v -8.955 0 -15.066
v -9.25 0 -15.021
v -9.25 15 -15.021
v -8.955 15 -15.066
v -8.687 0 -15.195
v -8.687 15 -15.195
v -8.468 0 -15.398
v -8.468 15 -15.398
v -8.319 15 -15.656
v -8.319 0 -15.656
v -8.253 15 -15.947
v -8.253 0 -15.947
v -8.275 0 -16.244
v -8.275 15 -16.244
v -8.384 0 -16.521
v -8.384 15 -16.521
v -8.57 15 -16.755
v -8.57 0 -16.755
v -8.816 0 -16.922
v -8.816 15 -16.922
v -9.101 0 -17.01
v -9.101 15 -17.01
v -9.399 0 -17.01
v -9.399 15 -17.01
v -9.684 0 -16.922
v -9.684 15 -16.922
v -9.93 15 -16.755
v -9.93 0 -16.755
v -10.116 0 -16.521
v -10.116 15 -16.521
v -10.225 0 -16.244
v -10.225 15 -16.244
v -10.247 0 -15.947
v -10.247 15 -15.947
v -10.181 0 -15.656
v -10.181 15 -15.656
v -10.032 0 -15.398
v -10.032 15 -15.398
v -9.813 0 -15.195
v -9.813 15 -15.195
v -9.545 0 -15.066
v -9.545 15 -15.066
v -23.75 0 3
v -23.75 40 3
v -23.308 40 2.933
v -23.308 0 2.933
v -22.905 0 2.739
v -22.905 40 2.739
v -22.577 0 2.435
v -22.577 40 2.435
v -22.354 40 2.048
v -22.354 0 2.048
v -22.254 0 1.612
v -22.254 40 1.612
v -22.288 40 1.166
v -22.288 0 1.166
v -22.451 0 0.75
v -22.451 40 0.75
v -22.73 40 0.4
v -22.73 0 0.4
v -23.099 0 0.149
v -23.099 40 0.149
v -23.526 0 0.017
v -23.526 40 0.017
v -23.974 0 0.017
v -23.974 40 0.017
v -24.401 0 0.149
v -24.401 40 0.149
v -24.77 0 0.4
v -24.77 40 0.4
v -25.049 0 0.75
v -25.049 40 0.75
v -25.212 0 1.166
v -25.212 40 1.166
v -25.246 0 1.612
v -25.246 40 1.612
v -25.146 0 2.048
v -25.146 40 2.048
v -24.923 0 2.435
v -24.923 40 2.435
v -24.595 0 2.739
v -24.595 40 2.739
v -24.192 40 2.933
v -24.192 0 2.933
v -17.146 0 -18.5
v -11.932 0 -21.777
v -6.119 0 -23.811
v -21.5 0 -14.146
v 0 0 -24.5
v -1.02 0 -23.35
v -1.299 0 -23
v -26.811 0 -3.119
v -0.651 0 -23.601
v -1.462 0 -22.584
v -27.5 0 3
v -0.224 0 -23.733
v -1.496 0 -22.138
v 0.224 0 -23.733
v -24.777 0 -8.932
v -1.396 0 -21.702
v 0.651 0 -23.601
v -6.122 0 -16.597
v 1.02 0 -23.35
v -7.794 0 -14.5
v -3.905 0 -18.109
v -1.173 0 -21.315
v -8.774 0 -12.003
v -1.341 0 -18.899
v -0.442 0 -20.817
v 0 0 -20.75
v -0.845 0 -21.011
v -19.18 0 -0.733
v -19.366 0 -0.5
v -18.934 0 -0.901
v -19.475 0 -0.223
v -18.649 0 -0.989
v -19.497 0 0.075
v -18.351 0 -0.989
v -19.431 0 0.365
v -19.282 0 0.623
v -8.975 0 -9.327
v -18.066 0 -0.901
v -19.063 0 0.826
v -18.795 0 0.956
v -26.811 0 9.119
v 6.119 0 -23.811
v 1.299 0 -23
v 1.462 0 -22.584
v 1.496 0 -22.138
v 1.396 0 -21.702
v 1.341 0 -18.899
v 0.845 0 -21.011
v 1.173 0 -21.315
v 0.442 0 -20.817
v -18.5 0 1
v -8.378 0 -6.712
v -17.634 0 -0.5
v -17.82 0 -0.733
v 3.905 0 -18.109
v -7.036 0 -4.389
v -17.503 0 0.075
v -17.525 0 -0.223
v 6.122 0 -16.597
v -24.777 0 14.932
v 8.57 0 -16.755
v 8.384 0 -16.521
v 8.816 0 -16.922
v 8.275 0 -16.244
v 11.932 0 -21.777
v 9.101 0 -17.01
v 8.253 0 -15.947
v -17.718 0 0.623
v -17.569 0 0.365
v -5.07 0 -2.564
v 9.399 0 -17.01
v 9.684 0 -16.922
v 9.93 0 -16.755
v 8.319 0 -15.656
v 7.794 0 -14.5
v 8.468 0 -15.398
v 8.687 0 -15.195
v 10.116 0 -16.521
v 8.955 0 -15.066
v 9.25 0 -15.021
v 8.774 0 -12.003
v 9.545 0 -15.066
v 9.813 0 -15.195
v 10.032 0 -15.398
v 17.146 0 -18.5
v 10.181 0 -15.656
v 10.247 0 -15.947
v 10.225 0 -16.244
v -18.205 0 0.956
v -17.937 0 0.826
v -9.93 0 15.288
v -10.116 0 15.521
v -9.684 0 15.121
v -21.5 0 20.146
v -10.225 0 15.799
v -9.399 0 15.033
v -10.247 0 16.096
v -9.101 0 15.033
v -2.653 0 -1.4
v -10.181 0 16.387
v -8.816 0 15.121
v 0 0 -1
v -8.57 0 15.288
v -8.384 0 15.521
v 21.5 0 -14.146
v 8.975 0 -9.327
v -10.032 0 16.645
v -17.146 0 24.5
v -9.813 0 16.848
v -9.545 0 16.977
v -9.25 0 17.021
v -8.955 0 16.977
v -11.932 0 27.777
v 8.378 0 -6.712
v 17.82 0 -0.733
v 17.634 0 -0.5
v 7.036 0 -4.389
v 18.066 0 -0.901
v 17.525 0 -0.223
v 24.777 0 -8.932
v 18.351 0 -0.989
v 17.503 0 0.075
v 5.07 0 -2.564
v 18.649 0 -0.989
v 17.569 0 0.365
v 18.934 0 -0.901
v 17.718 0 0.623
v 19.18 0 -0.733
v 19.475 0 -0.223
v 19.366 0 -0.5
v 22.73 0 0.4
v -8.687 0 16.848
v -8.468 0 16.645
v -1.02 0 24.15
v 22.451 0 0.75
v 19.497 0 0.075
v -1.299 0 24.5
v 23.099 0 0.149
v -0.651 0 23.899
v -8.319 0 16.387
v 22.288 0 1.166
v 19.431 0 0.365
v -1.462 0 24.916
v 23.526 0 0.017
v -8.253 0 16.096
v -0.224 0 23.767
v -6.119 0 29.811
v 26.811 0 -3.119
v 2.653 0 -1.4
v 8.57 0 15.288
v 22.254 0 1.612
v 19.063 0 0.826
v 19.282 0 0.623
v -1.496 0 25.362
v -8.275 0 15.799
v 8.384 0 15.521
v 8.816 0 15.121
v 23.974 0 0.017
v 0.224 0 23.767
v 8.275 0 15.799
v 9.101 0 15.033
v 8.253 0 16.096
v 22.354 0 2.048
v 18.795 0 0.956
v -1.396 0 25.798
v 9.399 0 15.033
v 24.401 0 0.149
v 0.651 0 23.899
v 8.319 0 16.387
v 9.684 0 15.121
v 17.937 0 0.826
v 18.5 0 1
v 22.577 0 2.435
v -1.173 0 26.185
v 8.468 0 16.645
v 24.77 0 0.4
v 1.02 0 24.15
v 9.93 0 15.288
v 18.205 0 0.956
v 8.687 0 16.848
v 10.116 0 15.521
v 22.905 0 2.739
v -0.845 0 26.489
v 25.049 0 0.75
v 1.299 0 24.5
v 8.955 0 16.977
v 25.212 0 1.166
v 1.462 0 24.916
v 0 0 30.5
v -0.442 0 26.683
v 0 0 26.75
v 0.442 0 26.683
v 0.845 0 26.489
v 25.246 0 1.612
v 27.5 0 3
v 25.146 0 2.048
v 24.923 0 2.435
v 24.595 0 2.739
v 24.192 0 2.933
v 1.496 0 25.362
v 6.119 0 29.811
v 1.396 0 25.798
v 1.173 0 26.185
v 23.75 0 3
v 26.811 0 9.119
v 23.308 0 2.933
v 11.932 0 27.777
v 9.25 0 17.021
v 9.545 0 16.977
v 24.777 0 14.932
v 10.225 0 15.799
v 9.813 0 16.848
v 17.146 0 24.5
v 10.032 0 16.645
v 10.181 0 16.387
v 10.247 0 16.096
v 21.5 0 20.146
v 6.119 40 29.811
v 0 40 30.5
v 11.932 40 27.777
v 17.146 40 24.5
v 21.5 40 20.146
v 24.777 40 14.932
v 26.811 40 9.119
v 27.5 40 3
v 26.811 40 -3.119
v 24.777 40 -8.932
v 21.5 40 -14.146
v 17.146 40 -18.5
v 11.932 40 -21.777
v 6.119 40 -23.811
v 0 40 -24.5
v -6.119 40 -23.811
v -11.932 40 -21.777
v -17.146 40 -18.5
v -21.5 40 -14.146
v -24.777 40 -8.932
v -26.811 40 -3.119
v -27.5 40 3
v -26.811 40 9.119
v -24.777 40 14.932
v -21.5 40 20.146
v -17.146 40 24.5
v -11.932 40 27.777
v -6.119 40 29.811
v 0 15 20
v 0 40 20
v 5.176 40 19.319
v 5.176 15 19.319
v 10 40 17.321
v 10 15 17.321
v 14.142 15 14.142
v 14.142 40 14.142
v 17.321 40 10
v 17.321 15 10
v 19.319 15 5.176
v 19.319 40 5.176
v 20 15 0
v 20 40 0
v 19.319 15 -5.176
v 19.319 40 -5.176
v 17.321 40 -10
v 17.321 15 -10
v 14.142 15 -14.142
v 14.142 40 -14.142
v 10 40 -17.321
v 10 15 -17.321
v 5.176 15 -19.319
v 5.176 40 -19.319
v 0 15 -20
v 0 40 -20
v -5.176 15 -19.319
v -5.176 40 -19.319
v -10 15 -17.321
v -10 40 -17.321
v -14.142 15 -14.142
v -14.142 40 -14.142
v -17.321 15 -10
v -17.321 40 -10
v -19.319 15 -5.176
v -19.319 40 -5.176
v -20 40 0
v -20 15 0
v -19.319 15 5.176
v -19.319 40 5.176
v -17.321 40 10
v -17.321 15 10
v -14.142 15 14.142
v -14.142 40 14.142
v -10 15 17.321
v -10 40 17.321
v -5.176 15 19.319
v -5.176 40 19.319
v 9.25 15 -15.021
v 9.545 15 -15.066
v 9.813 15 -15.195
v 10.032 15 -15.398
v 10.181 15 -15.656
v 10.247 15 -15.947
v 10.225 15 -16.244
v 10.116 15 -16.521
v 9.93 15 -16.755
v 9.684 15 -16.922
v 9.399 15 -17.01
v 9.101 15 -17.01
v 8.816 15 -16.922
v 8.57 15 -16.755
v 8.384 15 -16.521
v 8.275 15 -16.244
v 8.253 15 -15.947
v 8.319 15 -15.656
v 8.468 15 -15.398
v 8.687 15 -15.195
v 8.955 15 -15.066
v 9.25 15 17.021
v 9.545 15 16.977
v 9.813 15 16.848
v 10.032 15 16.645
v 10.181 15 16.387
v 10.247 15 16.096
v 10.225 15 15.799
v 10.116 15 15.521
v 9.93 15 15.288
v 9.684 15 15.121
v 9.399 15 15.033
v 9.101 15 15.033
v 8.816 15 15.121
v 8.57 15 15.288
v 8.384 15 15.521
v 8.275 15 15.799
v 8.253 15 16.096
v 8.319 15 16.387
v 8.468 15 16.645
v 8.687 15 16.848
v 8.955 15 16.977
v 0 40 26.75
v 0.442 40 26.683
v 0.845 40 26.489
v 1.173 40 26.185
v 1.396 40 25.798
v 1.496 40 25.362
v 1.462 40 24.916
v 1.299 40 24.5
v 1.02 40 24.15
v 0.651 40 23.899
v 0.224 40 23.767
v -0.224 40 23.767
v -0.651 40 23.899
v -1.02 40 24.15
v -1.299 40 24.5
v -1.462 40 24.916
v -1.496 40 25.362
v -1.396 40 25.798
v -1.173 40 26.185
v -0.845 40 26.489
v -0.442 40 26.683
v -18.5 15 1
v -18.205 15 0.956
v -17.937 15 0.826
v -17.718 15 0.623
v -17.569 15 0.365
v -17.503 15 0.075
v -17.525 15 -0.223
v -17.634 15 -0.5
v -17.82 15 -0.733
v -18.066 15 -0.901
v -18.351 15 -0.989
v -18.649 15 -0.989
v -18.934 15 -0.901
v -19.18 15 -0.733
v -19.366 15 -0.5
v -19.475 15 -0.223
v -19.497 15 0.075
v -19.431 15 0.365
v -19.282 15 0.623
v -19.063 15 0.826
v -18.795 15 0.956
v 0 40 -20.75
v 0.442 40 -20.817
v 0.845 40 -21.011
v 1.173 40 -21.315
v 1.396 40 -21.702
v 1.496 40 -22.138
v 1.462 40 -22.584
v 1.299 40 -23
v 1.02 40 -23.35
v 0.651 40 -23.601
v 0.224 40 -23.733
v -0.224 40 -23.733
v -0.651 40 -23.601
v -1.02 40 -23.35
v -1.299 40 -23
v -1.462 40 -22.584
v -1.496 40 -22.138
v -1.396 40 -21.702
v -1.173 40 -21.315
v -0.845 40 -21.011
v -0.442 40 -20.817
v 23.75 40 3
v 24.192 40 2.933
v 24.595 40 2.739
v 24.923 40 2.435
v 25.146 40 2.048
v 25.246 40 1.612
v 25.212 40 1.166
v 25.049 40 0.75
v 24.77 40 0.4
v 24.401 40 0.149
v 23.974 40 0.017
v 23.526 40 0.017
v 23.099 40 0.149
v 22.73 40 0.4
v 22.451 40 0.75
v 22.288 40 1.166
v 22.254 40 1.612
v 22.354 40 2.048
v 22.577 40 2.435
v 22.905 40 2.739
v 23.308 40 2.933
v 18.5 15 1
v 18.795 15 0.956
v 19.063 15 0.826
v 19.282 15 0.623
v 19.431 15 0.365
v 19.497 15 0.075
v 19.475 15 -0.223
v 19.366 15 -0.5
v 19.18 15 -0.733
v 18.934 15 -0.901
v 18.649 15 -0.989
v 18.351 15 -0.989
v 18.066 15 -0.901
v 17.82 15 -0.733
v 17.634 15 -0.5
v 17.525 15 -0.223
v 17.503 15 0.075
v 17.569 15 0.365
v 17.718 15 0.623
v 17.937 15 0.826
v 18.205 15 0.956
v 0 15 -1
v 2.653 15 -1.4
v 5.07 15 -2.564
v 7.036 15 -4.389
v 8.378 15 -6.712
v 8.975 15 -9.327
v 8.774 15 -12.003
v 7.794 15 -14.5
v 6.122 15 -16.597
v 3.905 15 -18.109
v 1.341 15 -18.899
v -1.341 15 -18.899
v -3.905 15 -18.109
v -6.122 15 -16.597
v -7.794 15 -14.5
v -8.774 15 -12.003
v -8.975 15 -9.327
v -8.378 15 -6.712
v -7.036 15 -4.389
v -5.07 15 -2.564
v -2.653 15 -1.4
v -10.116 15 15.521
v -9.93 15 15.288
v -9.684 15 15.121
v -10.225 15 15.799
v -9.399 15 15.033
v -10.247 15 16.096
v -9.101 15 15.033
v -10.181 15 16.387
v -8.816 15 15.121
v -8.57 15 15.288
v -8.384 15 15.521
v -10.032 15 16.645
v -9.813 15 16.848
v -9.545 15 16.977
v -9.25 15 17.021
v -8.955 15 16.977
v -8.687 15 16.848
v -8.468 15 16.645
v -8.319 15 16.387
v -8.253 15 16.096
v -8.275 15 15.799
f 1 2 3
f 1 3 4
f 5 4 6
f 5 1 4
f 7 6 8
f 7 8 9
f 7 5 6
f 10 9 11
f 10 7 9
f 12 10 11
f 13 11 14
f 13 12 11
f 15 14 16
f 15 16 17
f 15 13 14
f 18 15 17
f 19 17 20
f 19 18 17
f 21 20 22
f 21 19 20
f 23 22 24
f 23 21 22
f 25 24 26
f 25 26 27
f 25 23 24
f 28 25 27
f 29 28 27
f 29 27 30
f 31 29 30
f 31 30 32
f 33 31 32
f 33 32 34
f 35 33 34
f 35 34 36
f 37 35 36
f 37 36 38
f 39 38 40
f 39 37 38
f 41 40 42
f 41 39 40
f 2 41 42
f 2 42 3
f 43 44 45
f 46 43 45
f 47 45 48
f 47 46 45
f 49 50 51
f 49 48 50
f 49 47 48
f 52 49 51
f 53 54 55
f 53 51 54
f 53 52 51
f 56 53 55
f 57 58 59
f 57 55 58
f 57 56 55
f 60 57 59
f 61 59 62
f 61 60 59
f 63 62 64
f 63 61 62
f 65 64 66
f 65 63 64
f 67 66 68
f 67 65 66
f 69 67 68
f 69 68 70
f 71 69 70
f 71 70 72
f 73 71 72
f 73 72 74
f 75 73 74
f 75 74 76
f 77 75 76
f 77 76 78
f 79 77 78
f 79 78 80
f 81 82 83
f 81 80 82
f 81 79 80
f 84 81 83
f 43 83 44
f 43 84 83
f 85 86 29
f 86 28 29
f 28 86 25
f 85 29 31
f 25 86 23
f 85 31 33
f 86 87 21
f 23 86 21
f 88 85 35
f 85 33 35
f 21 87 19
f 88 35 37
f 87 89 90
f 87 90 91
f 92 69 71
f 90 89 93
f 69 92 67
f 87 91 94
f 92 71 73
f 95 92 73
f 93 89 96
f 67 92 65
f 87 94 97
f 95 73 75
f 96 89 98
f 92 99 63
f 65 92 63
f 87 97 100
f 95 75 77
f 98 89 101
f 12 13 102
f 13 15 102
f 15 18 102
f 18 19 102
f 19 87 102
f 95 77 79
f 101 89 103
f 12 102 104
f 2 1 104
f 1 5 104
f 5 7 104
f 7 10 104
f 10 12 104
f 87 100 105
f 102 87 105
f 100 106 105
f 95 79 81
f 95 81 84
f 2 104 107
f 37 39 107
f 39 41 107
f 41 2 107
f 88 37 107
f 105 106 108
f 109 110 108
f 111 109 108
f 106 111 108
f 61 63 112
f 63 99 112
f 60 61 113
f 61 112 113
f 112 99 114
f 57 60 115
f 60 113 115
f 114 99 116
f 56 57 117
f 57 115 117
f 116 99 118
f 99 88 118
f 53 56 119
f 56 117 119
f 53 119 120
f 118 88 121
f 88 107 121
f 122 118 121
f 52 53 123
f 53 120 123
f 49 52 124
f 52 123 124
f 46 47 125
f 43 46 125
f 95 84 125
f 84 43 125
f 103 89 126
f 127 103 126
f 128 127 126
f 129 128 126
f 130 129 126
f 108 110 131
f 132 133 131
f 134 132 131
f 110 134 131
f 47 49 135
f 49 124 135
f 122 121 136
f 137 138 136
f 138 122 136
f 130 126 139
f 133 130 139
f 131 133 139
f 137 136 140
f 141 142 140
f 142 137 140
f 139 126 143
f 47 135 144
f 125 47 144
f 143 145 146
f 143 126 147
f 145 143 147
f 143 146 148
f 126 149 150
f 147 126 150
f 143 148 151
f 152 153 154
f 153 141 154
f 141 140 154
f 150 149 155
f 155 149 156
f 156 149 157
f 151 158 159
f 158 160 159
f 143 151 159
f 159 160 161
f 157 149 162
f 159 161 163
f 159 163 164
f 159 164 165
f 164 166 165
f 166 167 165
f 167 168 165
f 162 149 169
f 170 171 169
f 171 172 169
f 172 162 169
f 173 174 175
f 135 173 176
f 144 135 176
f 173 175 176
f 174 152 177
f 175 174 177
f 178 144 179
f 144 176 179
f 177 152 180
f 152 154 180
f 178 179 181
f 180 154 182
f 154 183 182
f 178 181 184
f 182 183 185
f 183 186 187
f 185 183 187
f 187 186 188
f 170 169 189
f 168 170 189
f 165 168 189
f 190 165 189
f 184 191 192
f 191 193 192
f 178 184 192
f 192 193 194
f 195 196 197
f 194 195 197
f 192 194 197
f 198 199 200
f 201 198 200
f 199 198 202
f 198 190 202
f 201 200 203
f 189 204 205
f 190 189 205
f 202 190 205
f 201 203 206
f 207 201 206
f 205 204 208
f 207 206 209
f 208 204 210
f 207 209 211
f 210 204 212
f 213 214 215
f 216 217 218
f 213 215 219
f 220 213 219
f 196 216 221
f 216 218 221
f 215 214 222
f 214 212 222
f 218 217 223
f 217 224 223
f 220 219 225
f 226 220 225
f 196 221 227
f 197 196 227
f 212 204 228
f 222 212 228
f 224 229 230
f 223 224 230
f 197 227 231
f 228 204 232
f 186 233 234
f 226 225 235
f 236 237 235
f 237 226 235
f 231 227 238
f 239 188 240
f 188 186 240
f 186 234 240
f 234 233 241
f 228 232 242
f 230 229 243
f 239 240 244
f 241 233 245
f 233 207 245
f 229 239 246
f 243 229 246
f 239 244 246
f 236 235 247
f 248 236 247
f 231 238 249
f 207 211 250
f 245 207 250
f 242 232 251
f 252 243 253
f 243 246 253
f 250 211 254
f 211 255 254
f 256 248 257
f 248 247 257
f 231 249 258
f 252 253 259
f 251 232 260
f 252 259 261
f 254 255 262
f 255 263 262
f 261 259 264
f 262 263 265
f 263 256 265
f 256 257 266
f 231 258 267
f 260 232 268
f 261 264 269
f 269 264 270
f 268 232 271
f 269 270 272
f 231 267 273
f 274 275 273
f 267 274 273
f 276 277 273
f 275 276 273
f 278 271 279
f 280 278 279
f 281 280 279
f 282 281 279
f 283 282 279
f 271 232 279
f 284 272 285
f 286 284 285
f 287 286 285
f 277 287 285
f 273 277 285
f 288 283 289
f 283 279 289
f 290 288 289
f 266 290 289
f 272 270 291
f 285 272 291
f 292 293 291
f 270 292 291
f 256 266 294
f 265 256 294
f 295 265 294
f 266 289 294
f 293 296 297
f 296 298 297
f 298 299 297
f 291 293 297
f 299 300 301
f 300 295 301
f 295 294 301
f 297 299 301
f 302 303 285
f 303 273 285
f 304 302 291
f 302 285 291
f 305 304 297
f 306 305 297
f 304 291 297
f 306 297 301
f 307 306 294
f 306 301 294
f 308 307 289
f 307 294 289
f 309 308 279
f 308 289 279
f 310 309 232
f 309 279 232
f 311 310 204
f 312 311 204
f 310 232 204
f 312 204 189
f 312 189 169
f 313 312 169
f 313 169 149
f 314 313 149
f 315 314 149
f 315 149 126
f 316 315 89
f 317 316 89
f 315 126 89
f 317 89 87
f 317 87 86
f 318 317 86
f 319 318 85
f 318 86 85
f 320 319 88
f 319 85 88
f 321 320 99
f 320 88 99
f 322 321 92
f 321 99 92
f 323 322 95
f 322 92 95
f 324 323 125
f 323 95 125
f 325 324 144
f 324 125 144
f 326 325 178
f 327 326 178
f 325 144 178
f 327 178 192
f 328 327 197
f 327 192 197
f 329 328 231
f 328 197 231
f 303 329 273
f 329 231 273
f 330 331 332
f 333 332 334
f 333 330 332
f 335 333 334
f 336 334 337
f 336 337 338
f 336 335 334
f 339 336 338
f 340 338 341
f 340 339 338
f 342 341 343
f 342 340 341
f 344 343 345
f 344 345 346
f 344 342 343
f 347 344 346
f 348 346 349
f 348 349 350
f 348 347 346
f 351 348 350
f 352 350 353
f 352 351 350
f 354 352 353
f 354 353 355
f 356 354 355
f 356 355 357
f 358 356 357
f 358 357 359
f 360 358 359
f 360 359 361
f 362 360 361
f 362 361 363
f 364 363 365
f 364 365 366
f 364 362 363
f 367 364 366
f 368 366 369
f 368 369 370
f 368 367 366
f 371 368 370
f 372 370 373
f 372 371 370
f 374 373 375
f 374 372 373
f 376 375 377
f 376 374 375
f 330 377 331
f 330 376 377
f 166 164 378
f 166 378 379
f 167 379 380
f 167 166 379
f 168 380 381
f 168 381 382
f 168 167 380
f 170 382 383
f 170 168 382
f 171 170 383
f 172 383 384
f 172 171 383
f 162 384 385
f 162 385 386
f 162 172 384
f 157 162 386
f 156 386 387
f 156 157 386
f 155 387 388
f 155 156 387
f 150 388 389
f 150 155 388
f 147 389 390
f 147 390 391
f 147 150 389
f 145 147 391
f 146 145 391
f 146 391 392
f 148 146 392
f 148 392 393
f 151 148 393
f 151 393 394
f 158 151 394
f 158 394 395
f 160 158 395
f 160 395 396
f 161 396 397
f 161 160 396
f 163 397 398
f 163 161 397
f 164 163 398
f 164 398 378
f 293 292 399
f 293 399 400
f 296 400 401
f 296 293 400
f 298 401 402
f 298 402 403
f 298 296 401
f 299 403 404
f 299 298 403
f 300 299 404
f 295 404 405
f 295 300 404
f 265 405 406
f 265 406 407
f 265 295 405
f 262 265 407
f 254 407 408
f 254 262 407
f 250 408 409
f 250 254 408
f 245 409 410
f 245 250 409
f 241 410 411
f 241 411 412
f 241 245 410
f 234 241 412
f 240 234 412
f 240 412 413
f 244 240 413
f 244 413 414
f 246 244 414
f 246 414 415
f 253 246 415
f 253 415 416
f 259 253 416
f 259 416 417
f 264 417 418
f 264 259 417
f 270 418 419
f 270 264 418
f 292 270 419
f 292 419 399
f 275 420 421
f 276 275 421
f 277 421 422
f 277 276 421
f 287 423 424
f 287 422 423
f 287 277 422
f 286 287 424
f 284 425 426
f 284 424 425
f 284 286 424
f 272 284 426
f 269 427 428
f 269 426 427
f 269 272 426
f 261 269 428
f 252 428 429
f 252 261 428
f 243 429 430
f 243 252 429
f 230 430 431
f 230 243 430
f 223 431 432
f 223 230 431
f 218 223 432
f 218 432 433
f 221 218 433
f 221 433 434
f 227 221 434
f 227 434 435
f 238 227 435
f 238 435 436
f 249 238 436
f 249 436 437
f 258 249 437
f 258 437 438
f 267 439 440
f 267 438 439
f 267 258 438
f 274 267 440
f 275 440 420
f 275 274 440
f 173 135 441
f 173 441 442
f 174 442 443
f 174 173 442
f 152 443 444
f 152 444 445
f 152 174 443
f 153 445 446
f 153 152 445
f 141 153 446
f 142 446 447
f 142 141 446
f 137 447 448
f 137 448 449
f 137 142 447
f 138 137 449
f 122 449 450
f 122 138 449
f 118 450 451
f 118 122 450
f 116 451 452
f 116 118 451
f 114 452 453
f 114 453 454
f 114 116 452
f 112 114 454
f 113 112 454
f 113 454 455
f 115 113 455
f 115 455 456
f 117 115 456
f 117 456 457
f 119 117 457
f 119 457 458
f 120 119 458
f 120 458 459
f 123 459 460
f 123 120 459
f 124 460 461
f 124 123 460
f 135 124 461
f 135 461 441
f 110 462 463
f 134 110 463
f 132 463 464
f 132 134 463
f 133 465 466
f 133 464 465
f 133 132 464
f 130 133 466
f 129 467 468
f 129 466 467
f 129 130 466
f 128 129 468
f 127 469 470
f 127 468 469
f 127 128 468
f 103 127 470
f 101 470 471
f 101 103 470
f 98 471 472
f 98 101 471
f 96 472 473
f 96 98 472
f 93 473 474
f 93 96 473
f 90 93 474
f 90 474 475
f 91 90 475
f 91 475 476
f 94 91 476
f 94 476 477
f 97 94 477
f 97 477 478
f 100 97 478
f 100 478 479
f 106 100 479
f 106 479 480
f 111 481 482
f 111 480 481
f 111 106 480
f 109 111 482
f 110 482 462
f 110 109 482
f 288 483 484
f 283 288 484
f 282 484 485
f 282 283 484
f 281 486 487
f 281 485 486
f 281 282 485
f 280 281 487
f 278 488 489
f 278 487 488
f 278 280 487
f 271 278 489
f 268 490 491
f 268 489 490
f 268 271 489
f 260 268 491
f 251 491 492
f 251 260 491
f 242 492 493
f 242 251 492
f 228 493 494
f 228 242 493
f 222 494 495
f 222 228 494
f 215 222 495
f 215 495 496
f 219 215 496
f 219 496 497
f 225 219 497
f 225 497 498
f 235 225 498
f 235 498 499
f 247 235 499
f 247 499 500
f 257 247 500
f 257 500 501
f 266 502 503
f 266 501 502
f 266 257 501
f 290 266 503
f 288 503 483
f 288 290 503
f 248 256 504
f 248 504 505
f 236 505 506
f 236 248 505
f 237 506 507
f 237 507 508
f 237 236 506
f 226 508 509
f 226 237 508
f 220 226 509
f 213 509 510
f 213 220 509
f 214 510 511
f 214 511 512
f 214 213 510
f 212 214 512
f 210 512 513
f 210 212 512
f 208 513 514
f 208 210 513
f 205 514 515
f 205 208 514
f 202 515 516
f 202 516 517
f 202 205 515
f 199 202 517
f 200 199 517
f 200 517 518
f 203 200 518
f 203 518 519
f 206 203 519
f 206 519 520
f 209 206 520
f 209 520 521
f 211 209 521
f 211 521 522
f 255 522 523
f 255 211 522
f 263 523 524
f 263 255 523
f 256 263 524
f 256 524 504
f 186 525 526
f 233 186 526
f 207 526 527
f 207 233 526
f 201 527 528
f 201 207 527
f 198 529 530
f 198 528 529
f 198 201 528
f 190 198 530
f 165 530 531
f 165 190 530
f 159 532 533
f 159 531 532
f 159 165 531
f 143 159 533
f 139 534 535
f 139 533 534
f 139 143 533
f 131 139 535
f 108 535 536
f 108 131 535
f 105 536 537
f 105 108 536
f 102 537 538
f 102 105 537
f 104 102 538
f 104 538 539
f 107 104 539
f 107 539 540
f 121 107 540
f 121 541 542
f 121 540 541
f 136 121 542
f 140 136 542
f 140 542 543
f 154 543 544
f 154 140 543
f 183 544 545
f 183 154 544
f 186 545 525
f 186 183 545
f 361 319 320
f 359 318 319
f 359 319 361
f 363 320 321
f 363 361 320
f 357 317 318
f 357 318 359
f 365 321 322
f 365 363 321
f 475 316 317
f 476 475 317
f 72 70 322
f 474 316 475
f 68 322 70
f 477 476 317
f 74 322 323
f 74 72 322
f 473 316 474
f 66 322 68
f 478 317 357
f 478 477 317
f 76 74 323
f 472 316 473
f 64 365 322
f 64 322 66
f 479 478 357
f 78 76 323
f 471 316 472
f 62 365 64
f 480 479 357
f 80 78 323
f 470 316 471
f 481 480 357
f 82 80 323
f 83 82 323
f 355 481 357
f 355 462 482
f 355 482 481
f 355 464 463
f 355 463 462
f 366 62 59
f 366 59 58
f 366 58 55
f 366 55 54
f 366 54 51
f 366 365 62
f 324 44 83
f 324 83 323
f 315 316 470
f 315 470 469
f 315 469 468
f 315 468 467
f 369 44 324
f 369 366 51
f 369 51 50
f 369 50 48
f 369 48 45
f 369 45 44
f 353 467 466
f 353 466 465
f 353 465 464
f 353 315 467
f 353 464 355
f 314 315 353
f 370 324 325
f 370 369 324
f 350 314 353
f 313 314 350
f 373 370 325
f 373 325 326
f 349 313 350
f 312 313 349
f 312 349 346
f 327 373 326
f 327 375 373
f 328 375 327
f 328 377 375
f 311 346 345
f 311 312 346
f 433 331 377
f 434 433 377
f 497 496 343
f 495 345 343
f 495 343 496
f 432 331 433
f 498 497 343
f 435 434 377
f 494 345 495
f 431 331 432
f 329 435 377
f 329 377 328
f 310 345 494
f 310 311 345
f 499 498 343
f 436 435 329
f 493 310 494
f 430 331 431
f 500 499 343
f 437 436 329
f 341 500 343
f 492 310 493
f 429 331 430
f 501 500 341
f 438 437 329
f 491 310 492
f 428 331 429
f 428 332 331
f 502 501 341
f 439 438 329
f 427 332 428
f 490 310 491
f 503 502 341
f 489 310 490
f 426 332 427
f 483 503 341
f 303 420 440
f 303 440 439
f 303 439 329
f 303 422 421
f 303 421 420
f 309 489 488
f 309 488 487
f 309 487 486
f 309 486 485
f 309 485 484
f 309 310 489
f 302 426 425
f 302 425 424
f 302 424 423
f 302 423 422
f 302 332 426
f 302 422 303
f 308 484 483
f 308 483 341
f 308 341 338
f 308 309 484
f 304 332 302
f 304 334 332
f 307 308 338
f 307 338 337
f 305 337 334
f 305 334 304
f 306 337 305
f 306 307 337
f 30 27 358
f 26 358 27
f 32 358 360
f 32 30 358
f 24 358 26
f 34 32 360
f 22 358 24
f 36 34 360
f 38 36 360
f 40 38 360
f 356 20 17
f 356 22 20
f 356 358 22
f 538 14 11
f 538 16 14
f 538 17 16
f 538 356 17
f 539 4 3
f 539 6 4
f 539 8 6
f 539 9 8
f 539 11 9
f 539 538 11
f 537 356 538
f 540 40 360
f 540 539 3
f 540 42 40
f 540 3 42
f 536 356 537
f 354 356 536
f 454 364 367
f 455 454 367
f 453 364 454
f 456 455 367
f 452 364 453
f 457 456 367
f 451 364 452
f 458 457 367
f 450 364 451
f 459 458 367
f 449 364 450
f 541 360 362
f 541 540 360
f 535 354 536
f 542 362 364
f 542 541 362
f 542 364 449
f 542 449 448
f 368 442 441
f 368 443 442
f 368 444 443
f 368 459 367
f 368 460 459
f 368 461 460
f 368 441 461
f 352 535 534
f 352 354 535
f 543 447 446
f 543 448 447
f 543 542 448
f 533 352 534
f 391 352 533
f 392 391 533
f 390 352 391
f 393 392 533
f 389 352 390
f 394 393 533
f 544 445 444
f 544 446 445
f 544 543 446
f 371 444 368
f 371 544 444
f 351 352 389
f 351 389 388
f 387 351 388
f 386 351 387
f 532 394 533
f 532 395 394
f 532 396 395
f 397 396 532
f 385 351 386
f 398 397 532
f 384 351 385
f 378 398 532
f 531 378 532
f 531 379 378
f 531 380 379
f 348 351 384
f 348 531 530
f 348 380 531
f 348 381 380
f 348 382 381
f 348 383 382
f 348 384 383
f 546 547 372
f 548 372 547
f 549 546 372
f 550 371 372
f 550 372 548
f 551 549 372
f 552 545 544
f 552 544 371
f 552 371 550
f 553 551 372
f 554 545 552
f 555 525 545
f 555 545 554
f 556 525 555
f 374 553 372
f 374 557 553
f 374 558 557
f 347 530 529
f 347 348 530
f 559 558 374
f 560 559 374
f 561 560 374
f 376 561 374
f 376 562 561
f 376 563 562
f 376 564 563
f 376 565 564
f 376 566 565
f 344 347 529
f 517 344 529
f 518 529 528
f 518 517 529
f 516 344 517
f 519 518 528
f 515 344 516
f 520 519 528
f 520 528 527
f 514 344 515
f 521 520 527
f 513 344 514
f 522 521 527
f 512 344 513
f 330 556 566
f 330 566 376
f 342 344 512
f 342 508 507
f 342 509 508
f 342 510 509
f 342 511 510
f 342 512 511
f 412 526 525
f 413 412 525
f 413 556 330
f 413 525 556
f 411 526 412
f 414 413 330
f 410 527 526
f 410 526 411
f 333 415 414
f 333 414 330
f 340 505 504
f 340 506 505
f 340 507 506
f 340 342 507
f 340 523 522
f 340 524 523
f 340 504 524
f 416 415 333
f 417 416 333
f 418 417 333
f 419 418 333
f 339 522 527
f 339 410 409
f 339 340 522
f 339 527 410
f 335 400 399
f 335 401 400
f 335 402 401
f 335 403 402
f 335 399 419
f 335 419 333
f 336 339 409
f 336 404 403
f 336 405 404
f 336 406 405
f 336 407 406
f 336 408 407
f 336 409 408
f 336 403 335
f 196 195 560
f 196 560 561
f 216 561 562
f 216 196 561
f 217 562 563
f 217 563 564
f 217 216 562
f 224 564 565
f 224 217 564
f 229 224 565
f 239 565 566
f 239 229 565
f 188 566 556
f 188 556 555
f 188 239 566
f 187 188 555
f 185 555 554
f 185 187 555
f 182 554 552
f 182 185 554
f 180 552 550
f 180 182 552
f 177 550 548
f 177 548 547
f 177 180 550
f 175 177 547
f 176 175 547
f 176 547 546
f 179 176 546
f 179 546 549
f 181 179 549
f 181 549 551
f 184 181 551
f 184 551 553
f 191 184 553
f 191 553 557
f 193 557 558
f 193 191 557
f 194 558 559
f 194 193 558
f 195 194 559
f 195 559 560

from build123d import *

# Parameters (mm, degrees)
SKETCH1_R                = 27.5
SKETCH1_R_2              = 1
BOSS_EXTRUDE2_DEPTH      = 15
CUT_EXTRUDE17_DEPTH      = 44.720704477
CUT_EXTRUDE17_DEPTH_BACK = 44.720704477
SKETCH2_R                = 9
SKETCH7_R                = 27.5
SKETCH7_R_2              = 20
BOSS_EXTRUDE4_DEPTH      = 25
CUT_EXTRUDE18_DEPTH      = 58.328003628
CUT_EXTRUDE18_DEPTH_BACK = 58.328003628
SKETCH8_R                = 1.5


with BuildPart() as part:
    # Sketch1 → Boss-Extrude2 (new body)
    with BuildSketch(Plane(origin=(0, 0, 0), x_dir=(1, 0, 0), z_dir=(0, 1, 0))):
        with Locations(Location((0, -3, 0), (0, 0, 270))):
            Circle(SKETCH1_R)
        with Locations(Location((9.25, 16.02146997, 0), (0, 0, 270))):
            Circle(SKETCH1_R_2, mode=Mode.SUBTRACT)
        with Locations(Location((18.5, 0, 0), (0, 0, 270))):
            Circle(SKETCH1_R_2, mode=Mode.SUBTRACT)
        with Locations(Location((9.25, -16.02146997, 0), (0, 0, 270))):
            Circle(SKETCH1_R_2, mode=Mode.SUBTRACT)
        with Locations(Location((-9.25, -16.02146997, 0), (0, 0, 270))):
            Circle(SKETCH1_R_2, mode=Mode.SUBTRACT)
        with Locations(Location((-18.5, 0, 0), (0, 0, 270))):
            Circle(SKETCH1_R_2, mode=Mode.SUBTRACT)
        with Locations(Location((-9.25, 16.02146997, 0), (0, 0, 270))):
            Circle(SKETCH1_R_2, mode=Mode.SUBTRACT)
    extrude(amount=BOSS_EXTRUDE2_DEPTH)

    # Sketch2 → Cut-Extrude17 (cut, two sides: drawn at the far end of the back side and taken through both)
    with BuildSketch(Plane(origin=(0, 15, 0), x_dir=(1, 0, 0), z_dir=(0, 1, 0)).offset(-CUT_EXTRUDE17_DEPTH_BACK)):
        with Locations(Location((0, 10, 0), (0, 0, 270))):
            Circle(SKETCH2_R)
    extrude(amount=CUT_EXTRUDE17_DEPTH + CUT_EXTRUDE17_DEPTH_BACK, mode=Mode.SUBTRACT)

    # Sketch7 → Boss-Extrude4 (add)
    with BuildSketch(Plane(origin=(0, 15, 0), x_dir=(1, 0, 0), z_dir=(0, 1, 0))):
        with Locations(Location((0, -3, 0), (0, 0, 270))):
            Circle(SKETCH7_R)
        with Locations(Location((0, 0, 0), (0, 0, 270))):
            Circle(SKETCH7_R_2, mode=Mode.SUBTRACT)
    extrude(amount=BOSS_EXTRUDE4_DEPTH)

    # Sketch8 → Cut-Extrude18 (cut, two sides: drawn at the far end of the back side and taken through both)
    with BuildSketch(Plane(origin=(0, 40, 0), x_dir=(1, 0, 0), z_dir=(0, 1, 0)).offset(-CUT_EXTRUDE18_DEPTH_BACK)):
        with Locations(Location((0, 22.25, 0), (0, 0, 270))):
            Circle(SKETCH8_R)
        with Locations(Location((23.75, -1.5, 0), (0, 0, 270))):
            Circle(SKETCH8_R)
        with Locations(Location((0, -25.25, 0), (0, 0, 270))):
            Circle(SKETCH8_R)
        with Locations(Location((-23.75, -1.5, 0), (0, 0, 270))):
            Circle(SKETCH8_R)
    extrude(amount=CUT_EXTRUDE18_DEPTH + CUT_EXTRUDE18_DEPTH_BACK, mode=Mode.SUBTRACT)


solid = part.part
